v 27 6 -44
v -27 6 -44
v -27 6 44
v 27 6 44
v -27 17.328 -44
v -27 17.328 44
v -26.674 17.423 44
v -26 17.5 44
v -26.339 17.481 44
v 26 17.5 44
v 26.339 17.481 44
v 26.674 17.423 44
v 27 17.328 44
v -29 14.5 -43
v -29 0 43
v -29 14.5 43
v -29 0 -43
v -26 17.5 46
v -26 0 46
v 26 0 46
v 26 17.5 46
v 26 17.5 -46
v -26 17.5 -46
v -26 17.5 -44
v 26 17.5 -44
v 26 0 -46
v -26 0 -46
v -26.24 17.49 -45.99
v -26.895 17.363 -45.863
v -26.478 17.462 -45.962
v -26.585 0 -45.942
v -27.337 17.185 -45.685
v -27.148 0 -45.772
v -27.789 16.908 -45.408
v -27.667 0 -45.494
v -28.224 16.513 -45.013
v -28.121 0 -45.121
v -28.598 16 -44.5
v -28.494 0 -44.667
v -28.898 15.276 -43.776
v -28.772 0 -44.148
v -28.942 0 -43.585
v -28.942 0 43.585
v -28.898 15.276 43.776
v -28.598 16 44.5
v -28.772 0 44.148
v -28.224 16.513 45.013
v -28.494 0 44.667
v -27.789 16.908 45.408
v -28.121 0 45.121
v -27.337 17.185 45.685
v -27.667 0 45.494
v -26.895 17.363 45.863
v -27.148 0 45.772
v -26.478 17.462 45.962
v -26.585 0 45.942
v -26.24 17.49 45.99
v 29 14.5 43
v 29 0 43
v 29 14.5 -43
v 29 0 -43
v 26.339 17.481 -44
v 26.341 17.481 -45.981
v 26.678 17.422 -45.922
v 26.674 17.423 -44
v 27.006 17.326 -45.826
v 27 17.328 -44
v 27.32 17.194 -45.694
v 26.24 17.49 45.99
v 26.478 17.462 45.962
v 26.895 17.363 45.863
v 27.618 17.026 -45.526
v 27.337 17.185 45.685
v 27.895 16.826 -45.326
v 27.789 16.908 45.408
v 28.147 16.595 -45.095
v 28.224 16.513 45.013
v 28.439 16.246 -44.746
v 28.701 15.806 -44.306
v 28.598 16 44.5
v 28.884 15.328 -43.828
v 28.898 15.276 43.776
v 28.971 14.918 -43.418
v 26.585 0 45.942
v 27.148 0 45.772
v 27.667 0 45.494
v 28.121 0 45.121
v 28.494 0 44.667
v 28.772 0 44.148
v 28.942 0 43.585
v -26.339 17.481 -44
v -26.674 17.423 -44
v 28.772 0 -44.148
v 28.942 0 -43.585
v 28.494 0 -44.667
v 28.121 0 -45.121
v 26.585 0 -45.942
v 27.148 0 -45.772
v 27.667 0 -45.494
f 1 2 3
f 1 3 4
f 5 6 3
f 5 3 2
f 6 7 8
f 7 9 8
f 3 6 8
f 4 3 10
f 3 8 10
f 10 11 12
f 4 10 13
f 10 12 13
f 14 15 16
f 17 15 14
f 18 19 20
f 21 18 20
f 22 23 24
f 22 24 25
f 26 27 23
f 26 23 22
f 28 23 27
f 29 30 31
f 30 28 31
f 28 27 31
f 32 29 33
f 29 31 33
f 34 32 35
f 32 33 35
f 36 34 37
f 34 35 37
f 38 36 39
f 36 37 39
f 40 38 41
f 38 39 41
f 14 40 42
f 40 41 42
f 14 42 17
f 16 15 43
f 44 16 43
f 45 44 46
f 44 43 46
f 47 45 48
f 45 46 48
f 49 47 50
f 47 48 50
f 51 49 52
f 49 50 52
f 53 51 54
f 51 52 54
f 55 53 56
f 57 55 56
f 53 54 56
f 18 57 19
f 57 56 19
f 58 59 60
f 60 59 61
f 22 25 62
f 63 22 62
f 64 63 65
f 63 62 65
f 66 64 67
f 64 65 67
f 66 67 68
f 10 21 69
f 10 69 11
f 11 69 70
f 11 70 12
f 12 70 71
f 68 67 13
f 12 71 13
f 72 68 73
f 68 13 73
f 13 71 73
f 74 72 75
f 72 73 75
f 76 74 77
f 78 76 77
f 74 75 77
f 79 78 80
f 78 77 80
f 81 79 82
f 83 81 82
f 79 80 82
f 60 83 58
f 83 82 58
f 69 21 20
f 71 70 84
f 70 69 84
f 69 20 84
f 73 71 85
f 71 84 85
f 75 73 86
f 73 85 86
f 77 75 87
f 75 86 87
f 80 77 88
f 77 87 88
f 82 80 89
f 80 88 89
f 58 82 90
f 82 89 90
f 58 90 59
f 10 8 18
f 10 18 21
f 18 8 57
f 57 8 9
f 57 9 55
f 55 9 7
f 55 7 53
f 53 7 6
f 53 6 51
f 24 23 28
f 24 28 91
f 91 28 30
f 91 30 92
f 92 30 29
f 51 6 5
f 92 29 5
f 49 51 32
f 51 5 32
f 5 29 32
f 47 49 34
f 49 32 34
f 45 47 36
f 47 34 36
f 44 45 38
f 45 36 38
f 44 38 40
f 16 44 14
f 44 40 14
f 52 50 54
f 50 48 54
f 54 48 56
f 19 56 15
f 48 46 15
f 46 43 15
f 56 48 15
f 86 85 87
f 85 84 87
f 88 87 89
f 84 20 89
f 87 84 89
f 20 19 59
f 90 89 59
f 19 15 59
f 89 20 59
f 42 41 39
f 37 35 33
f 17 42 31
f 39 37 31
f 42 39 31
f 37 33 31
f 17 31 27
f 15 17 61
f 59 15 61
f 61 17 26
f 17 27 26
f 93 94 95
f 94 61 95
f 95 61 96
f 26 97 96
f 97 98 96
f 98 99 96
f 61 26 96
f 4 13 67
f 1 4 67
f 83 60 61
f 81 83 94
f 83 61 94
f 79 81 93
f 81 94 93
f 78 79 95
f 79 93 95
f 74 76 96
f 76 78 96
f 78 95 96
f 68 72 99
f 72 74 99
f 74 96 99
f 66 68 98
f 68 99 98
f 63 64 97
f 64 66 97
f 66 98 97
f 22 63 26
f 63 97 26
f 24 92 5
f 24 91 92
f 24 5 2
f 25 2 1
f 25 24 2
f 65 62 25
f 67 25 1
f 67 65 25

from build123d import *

# Parameters (mm, degrees)
SKETCH1_W           = 58
SKETCH1_H           = 92
BOSS_EXTRUDE1_DEPTH = 17.5
SKETCH2_W           = 54
SKETCH2_H           = 88
CUT_EXTRUDE1_DEPTH  = 11.5
FILLET3_R           = 3


with BuildPart() as part:
    # Sketch1 → Boss-Extrude1 (new body)
    with BuildSketch(Plane(origin=(0, 0, 0), x_dir=(1, 0, 0), z_dir=(0, 1, 0))):
        Rectangle(SKETCH1_W, SKETCH1_H)
    extrude(amount=BOSS_EXTRUDE1_DEPTH)

    # Sketch2 → Cut-Extrude1 (cut)
    with BuildSketch(Plane(origin=(0, 17.5, 0), x_dir=(1, 0, 0), z_dir=(0, 1, 0))):
        Rectangle(SKETCH2_W, SKETCH2_H)
    extrude(amount=-CUT_EXTRUDE1_DEPTH, mode=Mode.SUBTRACT)

    # Fillet3
    # the kernel refuses this fillet: 3 mm, written as the material it takes off along each edge
    with BuildSketch(Plane(origin=(29, -7.5, -46), x_dir=(0, 0, 1), z_dir=(0, 1, 0)), Plane(origin=(29, -7.5, 46), x_dir=(-1, 0, 0), z_dir=(0, 1, 0))) as fillet3_piece_1:
        with BuildLine():
            CenterArc((FILLET3_R, -FILLET3_R), FILLET3_R, 90, 90)
            Line((0, -FILLET3_R), (0, 0))
            Line((0, 0), (FILLET3_R, 0))
        make_face()
    extrude(amount=32.5, mode=Mode.SUBTRACT)
    with BuildSketch(Plane(origin=(29, 17.5, 53.5), x_dir=(0, -1, 0), z_dir=(0, 0, -1)), Plane(origin=(-29, 17.5, -53.5), x_dir=(0, -1, 0), z_dir=(0, 0, 1))) as fillet3_piece_2:
        with BuildLine():
            CenterArc((FILLET3_R, FILLET3_R), FILLET3_R, 180, 90)
            Line((0, FILLET3_R), (0, 0))
            Line((0, 0), (FILLET3_R, 0))
        make_face()
    extrude(amount=107, mode=Mode.SUBTRACT)
    with BuildSketch(Plane(origin=(-29, -7.5, -46), x_dir=(0, 0, 1), z_dir=(0, 1, 0)), Plane(origin=(-29, -7.5, 46), x_dir=(1, 0, 0), z_dir=(0, 1, 0))) as fillet3_piece_3:
        with BuildLine():
            CenterArc((FILLET3_R, FILLET3_R), FILLET3_R, 180, 90)
            Line((0, FILLET3_R), (0, 0))
            Line((0, 0), (FILLET3_R, 0))
        make_face()
    extrude(amount=32.5, mode=Mode.SUBTRACT)


solid = part.part
